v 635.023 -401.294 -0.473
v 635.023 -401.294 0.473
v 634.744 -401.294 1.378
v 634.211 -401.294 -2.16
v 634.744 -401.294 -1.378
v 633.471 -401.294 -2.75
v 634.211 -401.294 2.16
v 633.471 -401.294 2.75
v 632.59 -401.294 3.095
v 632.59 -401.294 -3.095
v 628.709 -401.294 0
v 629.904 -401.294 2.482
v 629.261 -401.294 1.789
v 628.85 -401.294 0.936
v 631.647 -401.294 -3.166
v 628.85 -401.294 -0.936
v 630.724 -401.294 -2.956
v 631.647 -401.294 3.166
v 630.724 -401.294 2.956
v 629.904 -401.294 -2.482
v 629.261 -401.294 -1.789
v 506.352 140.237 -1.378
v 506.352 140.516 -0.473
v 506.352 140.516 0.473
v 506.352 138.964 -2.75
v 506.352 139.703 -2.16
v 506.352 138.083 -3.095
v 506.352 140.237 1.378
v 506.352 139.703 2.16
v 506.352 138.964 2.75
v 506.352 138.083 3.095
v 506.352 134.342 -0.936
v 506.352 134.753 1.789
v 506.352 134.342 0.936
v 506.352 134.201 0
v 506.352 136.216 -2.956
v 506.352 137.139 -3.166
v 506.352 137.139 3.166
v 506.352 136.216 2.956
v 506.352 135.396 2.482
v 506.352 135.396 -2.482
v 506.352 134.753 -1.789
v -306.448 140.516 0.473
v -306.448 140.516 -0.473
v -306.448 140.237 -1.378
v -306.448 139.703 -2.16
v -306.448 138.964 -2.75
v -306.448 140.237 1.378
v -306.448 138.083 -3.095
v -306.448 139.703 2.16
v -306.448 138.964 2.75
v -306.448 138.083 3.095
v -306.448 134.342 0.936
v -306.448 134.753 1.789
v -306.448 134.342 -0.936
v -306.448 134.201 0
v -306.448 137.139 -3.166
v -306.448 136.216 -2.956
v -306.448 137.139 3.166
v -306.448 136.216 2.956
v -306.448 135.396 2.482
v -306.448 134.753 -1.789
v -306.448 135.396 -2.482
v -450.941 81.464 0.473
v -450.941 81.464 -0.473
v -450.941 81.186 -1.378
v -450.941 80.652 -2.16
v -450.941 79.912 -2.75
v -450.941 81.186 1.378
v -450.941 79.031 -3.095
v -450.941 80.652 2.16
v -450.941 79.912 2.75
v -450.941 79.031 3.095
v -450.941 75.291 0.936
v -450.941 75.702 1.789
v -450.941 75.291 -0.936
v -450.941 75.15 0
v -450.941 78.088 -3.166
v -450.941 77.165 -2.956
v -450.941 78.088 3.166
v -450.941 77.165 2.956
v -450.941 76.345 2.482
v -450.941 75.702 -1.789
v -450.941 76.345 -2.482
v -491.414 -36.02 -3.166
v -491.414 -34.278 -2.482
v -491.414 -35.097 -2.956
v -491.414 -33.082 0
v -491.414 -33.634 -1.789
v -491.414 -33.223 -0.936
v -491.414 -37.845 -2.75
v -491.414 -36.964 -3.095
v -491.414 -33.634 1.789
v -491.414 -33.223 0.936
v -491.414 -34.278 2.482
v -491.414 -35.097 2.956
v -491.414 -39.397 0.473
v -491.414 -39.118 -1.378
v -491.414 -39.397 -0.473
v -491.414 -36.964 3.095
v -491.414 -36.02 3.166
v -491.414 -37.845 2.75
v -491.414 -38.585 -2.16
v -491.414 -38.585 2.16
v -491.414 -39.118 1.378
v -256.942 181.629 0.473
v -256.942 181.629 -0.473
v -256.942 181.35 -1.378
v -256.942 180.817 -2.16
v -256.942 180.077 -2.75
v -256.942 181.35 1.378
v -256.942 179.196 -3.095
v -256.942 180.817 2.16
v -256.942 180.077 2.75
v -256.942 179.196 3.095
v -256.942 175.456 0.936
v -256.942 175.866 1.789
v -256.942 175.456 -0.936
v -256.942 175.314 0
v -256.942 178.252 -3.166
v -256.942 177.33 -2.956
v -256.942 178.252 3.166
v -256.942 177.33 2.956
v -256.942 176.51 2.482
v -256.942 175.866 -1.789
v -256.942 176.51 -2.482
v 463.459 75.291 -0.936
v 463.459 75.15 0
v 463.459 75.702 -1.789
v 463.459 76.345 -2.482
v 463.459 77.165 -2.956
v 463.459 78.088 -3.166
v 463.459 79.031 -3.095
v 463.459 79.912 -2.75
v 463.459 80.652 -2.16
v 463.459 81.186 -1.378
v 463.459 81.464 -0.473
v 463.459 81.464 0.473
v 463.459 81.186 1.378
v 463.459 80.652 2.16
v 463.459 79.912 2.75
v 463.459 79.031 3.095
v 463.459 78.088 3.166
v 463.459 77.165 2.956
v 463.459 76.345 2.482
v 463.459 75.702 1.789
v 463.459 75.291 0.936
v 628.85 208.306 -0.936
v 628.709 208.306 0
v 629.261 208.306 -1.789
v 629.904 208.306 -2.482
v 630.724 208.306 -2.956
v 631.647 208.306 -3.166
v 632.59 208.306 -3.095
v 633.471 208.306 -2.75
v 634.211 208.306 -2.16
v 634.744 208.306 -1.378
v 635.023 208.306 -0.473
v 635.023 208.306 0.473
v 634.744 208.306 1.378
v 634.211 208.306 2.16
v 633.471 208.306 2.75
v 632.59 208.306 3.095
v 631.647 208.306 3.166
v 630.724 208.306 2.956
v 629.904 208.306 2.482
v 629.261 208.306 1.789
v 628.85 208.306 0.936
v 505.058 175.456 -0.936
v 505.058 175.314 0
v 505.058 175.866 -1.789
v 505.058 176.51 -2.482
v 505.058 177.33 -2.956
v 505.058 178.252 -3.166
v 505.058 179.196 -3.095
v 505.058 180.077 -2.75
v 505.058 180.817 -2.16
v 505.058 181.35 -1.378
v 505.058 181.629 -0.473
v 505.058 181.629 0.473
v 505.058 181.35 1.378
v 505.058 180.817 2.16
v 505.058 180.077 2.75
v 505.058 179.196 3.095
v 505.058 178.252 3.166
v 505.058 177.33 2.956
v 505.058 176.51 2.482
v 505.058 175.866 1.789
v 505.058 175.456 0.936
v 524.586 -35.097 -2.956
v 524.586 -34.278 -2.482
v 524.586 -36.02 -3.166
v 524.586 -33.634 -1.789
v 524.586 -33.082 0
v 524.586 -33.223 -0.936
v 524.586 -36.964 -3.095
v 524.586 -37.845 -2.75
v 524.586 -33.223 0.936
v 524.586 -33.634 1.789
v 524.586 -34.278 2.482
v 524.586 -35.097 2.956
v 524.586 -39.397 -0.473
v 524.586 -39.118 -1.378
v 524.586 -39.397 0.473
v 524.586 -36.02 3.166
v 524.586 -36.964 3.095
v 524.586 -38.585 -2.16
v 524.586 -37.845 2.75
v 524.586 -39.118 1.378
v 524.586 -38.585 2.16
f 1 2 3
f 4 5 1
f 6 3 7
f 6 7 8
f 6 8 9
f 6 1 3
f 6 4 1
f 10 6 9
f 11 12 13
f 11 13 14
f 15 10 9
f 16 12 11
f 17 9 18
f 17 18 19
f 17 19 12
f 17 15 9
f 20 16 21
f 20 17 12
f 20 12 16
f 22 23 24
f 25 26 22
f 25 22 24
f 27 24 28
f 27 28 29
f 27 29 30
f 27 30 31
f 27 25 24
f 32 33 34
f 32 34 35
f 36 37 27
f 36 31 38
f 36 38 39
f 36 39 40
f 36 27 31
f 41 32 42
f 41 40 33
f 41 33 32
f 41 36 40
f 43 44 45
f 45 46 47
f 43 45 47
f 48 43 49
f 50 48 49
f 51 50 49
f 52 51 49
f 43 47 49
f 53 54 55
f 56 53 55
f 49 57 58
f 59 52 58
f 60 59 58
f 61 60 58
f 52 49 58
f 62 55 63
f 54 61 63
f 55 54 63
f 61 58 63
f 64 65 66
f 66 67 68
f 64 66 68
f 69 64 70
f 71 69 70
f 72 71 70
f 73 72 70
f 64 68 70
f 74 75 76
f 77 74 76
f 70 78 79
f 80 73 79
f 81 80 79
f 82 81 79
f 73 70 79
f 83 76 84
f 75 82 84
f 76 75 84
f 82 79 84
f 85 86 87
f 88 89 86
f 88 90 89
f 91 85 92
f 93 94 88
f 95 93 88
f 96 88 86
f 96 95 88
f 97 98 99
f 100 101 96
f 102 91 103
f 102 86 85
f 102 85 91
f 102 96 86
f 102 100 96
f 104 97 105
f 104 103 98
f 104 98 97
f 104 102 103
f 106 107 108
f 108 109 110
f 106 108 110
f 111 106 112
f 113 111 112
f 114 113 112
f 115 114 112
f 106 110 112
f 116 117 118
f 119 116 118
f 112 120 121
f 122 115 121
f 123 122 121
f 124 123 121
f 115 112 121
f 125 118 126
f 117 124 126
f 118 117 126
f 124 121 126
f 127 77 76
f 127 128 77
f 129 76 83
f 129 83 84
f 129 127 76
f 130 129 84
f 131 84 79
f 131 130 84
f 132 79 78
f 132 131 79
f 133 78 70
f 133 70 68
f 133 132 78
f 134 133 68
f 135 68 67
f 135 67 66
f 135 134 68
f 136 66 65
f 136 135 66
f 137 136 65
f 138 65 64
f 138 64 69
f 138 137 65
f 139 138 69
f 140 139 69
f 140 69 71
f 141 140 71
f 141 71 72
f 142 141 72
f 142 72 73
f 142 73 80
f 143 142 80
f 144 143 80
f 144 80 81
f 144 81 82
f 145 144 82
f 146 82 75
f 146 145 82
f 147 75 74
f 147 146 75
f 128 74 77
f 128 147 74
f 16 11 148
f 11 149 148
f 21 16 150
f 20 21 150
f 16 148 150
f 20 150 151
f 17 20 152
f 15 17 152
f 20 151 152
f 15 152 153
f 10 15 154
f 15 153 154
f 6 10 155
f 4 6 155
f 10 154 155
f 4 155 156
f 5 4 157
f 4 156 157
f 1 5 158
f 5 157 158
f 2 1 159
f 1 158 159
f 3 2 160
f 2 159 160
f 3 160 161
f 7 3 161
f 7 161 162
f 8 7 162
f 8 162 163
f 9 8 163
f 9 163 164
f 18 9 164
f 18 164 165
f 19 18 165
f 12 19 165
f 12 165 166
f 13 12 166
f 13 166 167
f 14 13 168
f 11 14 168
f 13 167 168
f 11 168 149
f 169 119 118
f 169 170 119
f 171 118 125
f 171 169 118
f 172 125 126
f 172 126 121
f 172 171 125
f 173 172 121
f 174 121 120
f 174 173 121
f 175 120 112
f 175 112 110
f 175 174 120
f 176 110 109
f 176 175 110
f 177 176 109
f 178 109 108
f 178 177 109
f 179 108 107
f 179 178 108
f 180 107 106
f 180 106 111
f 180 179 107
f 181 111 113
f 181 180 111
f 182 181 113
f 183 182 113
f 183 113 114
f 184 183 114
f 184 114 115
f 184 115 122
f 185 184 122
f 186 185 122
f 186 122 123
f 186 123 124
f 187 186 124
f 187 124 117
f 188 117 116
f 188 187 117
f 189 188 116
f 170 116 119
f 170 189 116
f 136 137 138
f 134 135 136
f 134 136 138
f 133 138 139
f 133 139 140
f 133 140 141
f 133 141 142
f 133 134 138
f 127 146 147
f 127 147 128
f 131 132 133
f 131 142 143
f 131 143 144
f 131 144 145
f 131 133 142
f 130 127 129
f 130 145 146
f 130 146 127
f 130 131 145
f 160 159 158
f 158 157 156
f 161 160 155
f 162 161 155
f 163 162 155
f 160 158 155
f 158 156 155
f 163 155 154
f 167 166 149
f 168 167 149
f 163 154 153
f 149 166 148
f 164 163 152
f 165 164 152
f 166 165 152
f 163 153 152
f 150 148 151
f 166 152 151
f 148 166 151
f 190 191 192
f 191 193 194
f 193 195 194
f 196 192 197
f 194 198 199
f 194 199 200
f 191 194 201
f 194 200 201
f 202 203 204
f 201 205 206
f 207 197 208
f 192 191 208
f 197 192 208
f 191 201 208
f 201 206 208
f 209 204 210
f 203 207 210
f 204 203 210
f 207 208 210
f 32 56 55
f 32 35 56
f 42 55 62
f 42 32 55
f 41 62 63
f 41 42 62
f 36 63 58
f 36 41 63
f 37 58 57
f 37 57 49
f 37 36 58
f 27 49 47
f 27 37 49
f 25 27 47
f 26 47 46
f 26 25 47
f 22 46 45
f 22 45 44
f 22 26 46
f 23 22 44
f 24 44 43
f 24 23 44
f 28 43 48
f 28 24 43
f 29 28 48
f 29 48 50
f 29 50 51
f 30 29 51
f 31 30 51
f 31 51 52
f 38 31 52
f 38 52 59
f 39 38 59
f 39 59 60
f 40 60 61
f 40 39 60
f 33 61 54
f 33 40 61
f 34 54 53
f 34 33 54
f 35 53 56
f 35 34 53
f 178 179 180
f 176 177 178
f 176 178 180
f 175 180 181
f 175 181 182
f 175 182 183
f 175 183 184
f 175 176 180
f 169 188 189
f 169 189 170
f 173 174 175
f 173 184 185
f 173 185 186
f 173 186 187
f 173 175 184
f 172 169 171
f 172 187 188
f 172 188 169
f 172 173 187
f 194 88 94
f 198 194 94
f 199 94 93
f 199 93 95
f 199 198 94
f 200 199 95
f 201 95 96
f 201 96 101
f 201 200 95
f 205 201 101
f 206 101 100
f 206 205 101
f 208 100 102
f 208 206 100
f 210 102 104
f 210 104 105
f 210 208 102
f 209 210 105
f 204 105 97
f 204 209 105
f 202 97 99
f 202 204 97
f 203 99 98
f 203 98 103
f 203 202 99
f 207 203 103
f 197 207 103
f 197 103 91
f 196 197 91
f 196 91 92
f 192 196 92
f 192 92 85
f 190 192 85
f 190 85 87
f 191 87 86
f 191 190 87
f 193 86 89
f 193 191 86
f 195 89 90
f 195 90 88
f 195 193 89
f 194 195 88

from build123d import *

# Parameters (mm, degrees)
F0_W = 1016
F0_H = 3.175
F2_W = 914.4
F2_H = 3.175
F3_W = 812.8
F3_H = 3.175
F4_W = 762
F4_H = 3.175
F8_W = 3.175
F8_H = 609.6
F9_W = 3.175
F9_H = 914.4


with BuildPart() as f1:
    # F0 (on Top) → F1 (revolve)
    with BuildSketch(Plane.XY):
        with Locations((16.585609, -34.669704)):
            Rectangle(F0_W, F0_H)
    revolve(axis=Axis((16.585609, -36.257204, 0), (1, 0, 0)))


with BuildPart() as f5:
    # F2 (on Top) → F5 (revolve)
    with BuildSketch(Plane.XY):
        with Locations((6.258547, 76.737433)):
            Rectangle(F2_W, F2_H)
    revolve(axis=Axis((6.258547, 78.324933, 0), (1, 0, 0)))


with BuildPart() as f6:
    # F3 (on Top) → F6 (revolve)
    with BuildSketch(Plane.XY):
        with Locations((99.952236, 135.788546)):
            Rectangle(F3_W, F3_H)
    revolve(axis=Axis((99.952236, 137.376046, 0), (1, 0, 0)))


with BuildPart() as f7:
    # F4 (on Top) → F7 (revolve)
    with BuildSketch(Plane.XY):
        with Locations((124.057755, 176.901974)):
            Rectangle(F4_W, F4_H)
    revolve(axis=Axis((124.057755, 178.489474, 0), (1, 0, 0)))


with BuildPart() as f10:
    # F8 (on Top) → F10 (revolve)
    with BuildSketch(Plane.XY):
        with Locations((630.296361, -96.494183)):
            Rectangle(F8_W, F8_H)
    revolve(axis=Axis((631.883861, -96.494183, 0), (0, -1, 0)))


with BuildPart() as f11:
    # F9 (on Top) → F11 (revolve)
    with BuildSketch(Plane.XY):
        with Locations((711.808065, -68.618268)):
            Rectangle(F9_W, F9_H)
    revolve(axis=Axis((713.395565, -68.618268, 0), (0, -1, 0)))


solid = Compound([f1.part, f5.part, f6.part, f7.part, f10.part])
